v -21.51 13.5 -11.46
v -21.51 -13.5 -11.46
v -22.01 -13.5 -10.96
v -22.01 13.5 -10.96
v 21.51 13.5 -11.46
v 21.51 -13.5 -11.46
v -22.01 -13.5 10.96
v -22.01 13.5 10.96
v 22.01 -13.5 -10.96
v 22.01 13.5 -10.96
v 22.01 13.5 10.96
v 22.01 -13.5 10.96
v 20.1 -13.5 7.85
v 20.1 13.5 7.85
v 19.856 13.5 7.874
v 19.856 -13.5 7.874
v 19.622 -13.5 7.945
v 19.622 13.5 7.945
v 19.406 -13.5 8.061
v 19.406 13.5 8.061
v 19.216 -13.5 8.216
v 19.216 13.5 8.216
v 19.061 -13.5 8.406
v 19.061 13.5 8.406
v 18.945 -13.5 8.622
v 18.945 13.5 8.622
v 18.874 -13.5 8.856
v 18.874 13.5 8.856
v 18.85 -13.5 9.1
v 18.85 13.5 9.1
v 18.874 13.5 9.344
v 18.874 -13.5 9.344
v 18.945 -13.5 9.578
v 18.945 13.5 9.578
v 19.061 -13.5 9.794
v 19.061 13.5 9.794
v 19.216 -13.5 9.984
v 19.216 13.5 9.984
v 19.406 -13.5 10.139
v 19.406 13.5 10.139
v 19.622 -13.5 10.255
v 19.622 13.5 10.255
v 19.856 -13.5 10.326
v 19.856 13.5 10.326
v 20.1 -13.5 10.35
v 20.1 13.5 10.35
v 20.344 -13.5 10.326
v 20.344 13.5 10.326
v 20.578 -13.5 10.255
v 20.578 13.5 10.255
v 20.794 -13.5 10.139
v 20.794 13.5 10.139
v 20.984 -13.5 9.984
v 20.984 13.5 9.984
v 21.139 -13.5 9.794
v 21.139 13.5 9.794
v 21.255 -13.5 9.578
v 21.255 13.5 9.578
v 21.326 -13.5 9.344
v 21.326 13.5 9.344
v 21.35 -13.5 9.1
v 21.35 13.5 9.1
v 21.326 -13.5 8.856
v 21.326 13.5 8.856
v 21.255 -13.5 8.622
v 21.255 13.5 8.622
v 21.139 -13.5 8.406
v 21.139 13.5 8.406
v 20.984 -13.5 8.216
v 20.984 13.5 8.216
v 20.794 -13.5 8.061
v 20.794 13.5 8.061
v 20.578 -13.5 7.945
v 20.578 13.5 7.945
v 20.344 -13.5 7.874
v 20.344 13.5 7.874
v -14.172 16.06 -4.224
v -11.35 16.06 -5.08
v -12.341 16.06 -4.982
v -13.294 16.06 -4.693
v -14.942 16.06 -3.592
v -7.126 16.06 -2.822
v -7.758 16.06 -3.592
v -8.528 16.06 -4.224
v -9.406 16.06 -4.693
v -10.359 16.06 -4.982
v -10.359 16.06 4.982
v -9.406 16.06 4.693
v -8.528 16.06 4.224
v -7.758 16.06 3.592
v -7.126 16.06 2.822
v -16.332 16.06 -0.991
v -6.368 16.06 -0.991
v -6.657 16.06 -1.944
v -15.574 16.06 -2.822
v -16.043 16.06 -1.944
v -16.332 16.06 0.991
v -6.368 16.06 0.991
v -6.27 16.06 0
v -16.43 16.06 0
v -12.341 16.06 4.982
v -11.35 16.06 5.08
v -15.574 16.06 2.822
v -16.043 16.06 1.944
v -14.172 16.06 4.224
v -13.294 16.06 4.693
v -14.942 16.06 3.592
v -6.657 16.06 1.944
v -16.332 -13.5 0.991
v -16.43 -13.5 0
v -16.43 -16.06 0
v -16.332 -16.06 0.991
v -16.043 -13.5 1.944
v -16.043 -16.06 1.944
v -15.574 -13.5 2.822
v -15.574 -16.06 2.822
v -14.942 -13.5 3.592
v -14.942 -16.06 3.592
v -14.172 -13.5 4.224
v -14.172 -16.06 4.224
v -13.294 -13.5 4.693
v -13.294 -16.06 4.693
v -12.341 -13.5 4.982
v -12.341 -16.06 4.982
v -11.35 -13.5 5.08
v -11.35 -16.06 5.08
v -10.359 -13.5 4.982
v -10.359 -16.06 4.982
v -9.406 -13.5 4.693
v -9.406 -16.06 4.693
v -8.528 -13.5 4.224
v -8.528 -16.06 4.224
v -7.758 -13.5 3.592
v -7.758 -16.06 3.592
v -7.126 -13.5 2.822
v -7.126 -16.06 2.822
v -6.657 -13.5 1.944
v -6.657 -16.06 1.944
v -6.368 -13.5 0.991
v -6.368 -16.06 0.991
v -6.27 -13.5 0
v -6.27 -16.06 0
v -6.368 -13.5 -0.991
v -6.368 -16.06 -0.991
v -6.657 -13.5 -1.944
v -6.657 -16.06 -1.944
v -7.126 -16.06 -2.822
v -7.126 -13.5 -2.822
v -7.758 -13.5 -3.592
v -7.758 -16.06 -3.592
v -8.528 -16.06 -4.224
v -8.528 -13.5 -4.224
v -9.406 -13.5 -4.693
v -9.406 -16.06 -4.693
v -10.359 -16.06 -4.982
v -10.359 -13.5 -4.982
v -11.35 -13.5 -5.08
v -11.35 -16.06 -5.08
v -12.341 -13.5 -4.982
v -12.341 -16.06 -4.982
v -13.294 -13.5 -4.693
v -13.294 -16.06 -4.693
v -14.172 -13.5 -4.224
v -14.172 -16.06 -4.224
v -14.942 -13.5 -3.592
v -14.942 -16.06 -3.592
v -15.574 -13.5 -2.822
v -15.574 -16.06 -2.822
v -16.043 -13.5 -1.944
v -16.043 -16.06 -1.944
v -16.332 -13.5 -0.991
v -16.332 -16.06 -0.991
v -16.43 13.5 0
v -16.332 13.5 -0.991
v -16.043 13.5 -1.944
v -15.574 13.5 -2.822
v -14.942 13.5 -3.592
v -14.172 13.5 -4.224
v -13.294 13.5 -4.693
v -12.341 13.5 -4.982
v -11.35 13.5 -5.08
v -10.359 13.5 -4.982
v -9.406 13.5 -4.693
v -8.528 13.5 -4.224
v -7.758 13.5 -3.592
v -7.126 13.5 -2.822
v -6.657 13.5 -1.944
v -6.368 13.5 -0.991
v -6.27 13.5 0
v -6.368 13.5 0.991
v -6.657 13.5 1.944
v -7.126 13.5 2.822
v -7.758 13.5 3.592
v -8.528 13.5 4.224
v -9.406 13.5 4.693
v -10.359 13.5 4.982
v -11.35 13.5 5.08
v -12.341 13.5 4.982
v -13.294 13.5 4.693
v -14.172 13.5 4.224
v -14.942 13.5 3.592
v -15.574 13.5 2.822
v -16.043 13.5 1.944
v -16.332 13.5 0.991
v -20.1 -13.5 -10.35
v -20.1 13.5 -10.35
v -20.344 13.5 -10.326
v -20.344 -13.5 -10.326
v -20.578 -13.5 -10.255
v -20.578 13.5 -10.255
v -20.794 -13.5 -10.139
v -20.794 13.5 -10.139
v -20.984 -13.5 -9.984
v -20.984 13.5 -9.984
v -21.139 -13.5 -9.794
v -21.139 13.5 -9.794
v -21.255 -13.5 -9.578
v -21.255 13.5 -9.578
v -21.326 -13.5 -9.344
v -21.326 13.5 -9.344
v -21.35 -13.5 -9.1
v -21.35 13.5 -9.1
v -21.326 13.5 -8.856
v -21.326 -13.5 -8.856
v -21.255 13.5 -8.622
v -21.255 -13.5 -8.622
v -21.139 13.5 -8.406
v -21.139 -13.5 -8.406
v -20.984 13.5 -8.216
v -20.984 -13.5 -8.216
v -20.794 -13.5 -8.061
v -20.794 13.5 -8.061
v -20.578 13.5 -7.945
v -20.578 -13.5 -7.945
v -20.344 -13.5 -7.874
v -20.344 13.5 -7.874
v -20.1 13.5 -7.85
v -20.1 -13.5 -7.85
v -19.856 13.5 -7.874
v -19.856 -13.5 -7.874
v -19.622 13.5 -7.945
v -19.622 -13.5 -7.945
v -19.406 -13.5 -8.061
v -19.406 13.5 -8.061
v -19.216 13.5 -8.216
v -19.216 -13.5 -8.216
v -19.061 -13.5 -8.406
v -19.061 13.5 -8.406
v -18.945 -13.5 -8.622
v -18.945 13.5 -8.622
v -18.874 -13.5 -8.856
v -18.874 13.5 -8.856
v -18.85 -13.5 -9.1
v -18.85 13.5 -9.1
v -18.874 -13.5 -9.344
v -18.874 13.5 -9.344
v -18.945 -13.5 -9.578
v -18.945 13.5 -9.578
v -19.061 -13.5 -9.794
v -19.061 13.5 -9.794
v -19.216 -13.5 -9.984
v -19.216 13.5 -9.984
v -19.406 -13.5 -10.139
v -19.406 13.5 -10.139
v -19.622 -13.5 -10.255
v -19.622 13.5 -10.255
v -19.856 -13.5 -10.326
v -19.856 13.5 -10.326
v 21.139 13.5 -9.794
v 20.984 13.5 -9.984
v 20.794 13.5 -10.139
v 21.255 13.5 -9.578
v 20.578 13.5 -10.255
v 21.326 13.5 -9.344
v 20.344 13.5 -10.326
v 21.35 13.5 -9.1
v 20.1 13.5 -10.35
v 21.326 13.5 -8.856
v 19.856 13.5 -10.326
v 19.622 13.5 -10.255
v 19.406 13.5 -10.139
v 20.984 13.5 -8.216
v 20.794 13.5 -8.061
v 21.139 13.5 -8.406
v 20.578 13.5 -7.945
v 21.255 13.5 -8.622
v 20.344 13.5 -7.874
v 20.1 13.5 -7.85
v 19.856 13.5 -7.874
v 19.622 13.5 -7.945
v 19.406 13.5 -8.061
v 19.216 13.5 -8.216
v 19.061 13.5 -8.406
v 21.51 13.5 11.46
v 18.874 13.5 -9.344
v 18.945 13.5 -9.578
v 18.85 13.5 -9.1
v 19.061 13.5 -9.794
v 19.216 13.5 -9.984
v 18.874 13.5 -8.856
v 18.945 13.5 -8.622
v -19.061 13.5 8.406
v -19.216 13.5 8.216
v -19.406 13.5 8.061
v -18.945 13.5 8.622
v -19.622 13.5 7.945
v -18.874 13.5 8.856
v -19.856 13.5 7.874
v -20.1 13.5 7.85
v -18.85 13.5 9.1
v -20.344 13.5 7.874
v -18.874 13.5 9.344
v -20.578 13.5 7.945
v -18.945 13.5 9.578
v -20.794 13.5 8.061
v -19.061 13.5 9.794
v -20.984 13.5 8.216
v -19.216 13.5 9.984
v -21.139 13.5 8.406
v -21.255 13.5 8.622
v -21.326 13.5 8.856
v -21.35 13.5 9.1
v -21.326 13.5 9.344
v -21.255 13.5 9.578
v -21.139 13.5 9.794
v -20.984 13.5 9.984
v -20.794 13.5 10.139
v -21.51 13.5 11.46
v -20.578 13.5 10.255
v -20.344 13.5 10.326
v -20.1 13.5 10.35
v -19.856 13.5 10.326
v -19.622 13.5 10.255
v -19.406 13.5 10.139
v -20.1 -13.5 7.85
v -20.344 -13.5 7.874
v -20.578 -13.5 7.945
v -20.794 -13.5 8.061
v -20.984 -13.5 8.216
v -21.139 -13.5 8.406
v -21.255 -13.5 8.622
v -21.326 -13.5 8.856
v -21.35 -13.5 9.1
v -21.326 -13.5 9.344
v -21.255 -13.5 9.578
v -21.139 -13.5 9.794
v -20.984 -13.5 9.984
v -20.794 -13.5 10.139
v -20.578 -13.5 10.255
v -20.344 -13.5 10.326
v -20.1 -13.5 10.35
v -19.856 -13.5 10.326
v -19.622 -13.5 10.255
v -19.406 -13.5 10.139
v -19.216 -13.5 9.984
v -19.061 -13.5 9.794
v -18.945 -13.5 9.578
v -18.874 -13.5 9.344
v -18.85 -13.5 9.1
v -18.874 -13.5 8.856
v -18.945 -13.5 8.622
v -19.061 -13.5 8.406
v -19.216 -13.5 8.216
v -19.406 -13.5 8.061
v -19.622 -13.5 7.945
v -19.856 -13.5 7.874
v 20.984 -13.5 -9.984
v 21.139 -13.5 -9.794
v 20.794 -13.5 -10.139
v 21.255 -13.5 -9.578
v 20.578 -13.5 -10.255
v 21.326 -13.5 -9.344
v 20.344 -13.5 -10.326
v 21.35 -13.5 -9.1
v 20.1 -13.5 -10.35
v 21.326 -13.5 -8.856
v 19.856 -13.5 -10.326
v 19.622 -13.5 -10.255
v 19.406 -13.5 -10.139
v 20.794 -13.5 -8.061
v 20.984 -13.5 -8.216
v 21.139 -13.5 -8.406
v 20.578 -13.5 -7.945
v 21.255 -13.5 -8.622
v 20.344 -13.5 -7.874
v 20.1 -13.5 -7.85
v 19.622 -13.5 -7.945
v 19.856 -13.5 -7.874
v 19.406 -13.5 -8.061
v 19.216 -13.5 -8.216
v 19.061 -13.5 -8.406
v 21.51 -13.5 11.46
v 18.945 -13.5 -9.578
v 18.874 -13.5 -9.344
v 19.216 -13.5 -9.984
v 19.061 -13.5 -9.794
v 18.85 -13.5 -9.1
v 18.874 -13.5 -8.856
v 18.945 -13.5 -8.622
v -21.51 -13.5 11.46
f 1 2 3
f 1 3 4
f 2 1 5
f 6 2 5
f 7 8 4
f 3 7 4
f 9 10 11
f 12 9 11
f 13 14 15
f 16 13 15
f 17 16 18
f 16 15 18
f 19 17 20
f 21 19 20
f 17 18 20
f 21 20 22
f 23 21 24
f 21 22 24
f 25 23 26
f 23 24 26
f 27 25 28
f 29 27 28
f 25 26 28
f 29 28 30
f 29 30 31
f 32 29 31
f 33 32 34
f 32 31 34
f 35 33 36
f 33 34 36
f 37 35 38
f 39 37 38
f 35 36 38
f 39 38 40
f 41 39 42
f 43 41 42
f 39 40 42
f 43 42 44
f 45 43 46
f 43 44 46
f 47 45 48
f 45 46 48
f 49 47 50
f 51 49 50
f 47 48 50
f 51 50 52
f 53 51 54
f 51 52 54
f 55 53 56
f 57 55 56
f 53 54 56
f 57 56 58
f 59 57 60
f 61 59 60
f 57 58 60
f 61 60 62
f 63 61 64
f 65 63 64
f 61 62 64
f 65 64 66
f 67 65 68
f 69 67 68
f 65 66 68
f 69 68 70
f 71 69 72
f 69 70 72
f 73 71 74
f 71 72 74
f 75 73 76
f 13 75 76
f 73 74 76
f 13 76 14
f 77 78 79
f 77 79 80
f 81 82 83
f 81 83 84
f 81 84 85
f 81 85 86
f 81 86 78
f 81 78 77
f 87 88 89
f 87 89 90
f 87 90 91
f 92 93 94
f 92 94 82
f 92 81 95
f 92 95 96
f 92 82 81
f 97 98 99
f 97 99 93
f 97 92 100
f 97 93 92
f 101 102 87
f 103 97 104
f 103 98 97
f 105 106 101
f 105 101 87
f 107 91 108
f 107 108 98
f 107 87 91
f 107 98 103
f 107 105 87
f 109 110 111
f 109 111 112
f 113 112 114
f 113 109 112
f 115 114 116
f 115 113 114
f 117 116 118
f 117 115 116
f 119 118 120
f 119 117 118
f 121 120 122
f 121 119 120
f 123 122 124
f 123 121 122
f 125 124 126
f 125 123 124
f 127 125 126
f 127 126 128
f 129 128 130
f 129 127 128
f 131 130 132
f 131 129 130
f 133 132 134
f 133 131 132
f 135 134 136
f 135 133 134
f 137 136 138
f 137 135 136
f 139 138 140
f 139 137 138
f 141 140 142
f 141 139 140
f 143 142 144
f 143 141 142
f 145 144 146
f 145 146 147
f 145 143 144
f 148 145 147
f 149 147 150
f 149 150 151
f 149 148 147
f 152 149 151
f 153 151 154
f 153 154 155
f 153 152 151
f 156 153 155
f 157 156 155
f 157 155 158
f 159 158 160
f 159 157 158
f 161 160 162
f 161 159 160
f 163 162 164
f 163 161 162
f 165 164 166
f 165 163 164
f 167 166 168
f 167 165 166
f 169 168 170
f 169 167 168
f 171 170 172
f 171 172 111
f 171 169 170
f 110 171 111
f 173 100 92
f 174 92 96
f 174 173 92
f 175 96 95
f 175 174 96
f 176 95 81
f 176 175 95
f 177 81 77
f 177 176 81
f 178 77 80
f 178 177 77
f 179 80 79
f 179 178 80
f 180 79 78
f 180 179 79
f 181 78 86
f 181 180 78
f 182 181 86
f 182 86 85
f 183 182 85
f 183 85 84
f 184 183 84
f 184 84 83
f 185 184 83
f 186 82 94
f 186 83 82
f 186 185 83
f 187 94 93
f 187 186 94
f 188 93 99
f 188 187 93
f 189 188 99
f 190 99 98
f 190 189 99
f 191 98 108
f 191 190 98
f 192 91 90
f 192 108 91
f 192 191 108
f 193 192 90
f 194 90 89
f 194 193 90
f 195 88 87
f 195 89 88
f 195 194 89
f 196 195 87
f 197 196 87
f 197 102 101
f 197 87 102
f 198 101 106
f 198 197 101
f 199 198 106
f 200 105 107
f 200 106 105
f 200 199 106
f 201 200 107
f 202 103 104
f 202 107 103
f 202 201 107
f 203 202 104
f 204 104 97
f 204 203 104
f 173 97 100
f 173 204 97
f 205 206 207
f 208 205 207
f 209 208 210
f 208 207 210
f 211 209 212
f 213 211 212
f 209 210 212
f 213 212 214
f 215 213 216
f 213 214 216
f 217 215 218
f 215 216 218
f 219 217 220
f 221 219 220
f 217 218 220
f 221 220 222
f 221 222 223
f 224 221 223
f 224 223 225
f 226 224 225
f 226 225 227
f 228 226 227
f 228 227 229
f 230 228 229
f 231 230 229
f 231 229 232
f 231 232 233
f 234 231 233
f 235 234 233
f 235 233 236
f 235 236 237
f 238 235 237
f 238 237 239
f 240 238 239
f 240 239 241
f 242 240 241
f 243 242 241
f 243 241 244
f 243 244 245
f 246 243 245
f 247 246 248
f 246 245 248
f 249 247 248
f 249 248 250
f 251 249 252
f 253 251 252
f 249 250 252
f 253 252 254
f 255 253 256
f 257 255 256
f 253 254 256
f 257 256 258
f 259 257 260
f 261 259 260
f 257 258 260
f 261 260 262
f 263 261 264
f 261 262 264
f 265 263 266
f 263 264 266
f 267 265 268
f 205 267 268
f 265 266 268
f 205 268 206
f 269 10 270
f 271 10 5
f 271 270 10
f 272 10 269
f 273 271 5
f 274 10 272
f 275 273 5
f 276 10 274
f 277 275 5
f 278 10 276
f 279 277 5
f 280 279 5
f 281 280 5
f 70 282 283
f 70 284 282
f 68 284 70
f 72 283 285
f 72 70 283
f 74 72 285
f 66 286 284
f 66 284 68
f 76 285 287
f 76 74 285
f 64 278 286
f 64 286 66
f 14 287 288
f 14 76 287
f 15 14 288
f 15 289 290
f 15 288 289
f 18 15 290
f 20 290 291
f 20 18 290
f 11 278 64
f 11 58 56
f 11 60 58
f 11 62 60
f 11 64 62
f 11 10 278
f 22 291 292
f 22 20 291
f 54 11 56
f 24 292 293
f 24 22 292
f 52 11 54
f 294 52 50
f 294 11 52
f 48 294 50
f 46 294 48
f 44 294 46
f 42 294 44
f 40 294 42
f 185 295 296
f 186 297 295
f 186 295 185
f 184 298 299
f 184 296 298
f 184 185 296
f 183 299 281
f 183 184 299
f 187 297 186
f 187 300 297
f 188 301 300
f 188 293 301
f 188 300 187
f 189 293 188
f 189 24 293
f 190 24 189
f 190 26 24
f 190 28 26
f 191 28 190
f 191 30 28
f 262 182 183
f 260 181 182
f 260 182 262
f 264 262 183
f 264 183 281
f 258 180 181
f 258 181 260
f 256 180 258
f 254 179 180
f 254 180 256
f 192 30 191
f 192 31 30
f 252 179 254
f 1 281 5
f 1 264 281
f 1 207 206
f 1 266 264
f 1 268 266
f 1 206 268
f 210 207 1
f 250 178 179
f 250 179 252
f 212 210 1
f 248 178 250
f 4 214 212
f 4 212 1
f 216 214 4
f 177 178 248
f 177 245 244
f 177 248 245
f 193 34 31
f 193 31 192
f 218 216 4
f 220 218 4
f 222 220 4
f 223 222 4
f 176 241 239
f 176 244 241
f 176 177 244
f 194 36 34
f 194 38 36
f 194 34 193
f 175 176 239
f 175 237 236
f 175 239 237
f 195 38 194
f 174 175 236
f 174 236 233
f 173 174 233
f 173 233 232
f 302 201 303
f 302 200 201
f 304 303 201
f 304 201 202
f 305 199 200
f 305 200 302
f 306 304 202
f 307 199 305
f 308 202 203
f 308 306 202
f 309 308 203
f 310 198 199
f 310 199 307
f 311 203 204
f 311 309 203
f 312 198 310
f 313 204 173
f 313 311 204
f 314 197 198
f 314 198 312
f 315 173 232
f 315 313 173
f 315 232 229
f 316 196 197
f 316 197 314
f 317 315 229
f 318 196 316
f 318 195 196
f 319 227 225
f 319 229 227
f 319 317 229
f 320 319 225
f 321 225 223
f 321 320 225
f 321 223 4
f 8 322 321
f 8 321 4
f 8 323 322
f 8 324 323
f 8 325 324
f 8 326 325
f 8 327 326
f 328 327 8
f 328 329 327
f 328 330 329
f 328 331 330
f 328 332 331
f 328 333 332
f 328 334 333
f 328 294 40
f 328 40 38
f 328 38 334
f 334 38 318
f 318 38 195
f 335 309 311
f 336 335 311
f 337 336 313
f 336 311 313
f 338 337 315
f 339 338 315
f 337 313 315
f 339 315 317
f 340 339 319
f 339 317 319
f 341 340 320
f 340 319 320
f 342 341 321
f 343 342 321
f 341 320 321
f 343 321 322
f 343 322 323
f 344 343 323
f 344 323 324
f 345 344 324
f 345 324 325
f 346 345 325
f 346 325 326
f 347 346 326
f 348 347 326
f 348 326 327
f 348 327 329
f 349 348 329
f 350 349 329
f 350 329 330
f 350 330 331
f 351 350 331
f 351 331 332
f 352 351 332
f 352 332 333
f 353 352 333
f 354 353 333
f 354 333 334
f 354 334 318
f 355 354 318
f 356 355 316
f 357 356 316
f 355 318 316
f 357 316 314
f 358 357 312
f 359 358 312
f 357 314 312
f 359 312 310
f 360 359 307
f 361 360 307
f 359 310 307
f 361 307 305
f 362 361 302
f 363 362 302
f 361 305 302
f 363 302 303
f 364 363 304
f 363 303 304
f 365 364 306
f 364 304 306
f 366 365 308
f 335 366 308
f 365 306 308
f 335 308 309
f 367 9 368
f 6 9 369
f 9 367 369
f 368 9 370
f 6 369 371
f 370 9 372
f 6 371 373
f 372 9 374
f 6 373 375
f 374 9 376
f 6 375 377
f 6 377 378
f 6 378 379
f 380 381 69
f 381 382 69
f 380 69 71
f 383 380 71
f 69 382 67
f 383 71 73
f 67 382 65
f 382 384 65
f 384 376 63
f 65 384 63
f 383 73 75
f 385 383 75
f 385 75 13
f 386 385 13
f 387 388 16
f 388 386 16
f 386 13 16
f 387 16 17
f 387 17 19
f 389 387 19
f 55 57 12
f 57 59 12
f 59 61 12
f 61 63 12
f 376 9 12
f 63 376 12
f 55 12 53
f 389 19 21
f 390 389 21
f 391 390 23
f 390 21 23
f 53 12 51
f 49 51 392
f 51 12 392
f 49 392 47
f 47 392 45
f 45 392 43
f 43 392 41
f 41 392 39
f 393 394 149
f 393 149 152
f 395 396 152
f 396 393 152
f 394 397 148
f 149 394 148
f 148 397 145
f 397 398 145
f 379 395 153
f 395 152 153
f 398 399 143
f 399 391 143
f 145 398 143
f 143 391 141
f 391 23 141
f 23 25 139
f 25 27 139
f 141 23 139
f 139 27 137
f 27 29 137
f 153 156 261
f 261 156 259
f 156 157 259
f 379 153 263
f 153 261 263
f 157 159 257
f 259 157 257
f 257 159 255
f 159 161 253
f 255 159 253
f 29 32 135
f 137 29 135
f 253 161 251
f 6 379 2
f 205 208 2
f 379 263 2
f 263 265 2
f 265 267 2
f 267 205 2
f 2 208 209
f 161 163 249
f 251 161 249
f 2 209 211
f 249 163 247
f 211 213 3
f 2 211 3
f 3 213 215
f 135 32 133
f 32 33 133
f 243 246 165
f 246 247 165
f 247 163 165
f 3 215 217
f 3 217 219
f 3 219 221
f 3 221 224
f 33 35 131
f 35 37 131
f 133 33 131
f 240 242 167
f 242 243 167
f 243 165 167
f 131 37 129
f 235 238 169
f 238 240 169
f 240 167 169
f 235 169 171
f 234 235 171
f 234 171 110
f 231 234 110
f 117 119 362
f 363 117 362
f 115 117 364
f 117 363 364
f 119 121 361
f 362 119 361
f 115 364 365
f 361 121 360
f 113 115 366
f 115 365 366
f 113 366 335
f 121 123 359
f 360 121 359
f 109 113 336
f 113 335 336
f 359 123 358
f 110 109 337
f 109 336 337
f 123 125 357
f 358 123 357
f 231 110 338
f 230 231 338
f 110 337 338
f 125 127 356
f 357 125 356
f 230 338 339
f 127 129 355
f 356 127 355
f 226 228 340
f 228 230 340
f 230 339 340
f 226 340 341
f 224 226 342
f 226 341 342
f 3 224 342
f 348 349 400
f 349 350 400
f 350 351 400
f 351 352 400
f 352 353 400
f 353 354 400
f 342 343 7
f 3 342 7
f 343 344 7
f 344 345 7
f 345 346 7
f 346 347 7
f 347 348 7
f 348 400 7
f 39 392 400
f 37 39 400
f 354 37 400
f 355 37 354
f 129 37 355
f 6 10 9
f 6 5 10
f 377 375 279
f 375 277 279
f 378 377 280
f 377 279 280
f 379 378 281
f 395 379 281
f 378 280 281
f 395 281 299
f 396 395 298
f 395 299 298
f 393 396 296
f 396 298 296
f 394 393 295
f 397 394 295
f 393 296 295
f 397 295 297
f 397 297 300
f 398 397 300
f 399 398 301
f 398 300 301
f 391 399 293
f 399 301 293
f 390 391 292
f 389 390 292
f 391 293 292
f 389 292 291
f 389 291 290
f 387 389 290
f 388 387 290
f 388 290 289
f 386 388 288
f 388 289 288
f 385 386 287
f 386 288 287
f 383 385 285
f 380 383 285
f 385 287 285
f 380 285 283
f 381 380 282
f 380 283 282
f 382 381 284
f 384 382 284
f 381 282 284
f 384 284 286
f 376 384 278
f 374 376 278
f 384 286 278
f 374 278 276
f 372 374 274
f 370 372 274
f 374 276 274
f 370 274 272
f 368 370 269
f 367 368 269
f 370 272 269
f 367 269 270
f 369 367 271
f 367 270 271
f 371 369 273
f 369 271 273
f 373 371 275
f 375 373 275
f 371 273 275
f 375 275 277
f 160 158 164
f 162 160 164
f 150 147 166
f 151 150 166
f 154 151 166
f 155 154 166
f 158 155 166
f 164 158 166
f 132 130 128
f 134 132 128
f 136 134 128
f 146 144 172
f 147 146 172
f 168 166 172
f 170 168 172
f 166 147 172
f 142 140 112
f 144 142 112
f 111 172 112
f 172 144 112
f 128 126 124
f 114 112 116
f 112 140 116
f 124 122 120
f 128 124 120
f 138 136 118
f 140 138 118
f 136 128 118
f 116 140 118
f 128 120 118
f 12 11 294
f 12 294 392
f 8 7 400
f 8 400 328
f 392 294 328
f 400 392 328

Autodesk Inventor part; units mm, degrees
ref_plane "YZ Plane" through (0, 0, 0) normal (1, 0, 0) x (0, 1, 0)
ref_plane "XZ Plane" through (0, 0, 0) normal (0, 1, 0) x (-1, 0, 0)
ref_plane "XY Plane" through (0, 0, 0) normal (0, 0, 1) x (1, 0, 0)
sketch "Sketch1" plane through (0, 0, 0) normal (0, 1, 0) x (-1, 0, 0)
  line L0 (-22.01, 11.46) -> (22.01, 11.46)
  line L1 (22.01, 11.46) -> (22.01, -11.46)
  line L2 (22.01, -11.46) -> (-22.01, -11.46)
  line L3 (-22.01, -11.46) -> (-22.01, 11.46)
  line L4 (-22.01, 11.46) -> (22.01, -11.46) construction
  line L5 (22.01, 11.46) -> (-22.01, -11.46) construction
  line L6 (20.1, -9.1) -> (-20.1, -9.1) construction
  line L7 (-20.1, -9.1) -> (-20.1, 9.1) construction
  line L8 (-20.1, 9.1) -> (20.1, 9.1) construction
  line L9 (20.1, 9.1) -> (20.1, -9.1) construction
  line L10 (20.1, -9.1) -> (-20.1, 9.1) construction
  line L11 (-20.1, -9.1) -> (20.1, 9.1) construction
  circle A0 centre (11.35, 0) radius 5.08
  point P0 (0, 0)
  point P1 (22.01, 0)
  dimension "d0" = 18.2
  dimension "d1" = 40.2
  dimension "d2" = 44.02
  dimension "d3" = 22.92
  dimension "d4" = 33.36
  dimension "d5" = 10.16
extrude "Extrusion1" add sketch "Sketch1" along normal mid plane 27 contours L0 L1 L2 L3 | A0
hole "Hole1" at (20.1, 0, -9.1) at (20.1, 0, 9.1) at (-20.1, 0, -9.1) at (-20.1, 0, 9.1) direction (0, 1, 0) diameter 2.5 end through all both
chamfer "Chamfer1" distance 0.5 angle 45 4 edges at (-22.01, 0, -11.46) (-22.01, 0, 11.46) (22.01, 0, -11.46) (22.01, 0, 11.46)
extrude "Extrusion2" add sketch "Sketch1" along normal mid plane 32.12 contours A0
properties part number "Servo_Block"
